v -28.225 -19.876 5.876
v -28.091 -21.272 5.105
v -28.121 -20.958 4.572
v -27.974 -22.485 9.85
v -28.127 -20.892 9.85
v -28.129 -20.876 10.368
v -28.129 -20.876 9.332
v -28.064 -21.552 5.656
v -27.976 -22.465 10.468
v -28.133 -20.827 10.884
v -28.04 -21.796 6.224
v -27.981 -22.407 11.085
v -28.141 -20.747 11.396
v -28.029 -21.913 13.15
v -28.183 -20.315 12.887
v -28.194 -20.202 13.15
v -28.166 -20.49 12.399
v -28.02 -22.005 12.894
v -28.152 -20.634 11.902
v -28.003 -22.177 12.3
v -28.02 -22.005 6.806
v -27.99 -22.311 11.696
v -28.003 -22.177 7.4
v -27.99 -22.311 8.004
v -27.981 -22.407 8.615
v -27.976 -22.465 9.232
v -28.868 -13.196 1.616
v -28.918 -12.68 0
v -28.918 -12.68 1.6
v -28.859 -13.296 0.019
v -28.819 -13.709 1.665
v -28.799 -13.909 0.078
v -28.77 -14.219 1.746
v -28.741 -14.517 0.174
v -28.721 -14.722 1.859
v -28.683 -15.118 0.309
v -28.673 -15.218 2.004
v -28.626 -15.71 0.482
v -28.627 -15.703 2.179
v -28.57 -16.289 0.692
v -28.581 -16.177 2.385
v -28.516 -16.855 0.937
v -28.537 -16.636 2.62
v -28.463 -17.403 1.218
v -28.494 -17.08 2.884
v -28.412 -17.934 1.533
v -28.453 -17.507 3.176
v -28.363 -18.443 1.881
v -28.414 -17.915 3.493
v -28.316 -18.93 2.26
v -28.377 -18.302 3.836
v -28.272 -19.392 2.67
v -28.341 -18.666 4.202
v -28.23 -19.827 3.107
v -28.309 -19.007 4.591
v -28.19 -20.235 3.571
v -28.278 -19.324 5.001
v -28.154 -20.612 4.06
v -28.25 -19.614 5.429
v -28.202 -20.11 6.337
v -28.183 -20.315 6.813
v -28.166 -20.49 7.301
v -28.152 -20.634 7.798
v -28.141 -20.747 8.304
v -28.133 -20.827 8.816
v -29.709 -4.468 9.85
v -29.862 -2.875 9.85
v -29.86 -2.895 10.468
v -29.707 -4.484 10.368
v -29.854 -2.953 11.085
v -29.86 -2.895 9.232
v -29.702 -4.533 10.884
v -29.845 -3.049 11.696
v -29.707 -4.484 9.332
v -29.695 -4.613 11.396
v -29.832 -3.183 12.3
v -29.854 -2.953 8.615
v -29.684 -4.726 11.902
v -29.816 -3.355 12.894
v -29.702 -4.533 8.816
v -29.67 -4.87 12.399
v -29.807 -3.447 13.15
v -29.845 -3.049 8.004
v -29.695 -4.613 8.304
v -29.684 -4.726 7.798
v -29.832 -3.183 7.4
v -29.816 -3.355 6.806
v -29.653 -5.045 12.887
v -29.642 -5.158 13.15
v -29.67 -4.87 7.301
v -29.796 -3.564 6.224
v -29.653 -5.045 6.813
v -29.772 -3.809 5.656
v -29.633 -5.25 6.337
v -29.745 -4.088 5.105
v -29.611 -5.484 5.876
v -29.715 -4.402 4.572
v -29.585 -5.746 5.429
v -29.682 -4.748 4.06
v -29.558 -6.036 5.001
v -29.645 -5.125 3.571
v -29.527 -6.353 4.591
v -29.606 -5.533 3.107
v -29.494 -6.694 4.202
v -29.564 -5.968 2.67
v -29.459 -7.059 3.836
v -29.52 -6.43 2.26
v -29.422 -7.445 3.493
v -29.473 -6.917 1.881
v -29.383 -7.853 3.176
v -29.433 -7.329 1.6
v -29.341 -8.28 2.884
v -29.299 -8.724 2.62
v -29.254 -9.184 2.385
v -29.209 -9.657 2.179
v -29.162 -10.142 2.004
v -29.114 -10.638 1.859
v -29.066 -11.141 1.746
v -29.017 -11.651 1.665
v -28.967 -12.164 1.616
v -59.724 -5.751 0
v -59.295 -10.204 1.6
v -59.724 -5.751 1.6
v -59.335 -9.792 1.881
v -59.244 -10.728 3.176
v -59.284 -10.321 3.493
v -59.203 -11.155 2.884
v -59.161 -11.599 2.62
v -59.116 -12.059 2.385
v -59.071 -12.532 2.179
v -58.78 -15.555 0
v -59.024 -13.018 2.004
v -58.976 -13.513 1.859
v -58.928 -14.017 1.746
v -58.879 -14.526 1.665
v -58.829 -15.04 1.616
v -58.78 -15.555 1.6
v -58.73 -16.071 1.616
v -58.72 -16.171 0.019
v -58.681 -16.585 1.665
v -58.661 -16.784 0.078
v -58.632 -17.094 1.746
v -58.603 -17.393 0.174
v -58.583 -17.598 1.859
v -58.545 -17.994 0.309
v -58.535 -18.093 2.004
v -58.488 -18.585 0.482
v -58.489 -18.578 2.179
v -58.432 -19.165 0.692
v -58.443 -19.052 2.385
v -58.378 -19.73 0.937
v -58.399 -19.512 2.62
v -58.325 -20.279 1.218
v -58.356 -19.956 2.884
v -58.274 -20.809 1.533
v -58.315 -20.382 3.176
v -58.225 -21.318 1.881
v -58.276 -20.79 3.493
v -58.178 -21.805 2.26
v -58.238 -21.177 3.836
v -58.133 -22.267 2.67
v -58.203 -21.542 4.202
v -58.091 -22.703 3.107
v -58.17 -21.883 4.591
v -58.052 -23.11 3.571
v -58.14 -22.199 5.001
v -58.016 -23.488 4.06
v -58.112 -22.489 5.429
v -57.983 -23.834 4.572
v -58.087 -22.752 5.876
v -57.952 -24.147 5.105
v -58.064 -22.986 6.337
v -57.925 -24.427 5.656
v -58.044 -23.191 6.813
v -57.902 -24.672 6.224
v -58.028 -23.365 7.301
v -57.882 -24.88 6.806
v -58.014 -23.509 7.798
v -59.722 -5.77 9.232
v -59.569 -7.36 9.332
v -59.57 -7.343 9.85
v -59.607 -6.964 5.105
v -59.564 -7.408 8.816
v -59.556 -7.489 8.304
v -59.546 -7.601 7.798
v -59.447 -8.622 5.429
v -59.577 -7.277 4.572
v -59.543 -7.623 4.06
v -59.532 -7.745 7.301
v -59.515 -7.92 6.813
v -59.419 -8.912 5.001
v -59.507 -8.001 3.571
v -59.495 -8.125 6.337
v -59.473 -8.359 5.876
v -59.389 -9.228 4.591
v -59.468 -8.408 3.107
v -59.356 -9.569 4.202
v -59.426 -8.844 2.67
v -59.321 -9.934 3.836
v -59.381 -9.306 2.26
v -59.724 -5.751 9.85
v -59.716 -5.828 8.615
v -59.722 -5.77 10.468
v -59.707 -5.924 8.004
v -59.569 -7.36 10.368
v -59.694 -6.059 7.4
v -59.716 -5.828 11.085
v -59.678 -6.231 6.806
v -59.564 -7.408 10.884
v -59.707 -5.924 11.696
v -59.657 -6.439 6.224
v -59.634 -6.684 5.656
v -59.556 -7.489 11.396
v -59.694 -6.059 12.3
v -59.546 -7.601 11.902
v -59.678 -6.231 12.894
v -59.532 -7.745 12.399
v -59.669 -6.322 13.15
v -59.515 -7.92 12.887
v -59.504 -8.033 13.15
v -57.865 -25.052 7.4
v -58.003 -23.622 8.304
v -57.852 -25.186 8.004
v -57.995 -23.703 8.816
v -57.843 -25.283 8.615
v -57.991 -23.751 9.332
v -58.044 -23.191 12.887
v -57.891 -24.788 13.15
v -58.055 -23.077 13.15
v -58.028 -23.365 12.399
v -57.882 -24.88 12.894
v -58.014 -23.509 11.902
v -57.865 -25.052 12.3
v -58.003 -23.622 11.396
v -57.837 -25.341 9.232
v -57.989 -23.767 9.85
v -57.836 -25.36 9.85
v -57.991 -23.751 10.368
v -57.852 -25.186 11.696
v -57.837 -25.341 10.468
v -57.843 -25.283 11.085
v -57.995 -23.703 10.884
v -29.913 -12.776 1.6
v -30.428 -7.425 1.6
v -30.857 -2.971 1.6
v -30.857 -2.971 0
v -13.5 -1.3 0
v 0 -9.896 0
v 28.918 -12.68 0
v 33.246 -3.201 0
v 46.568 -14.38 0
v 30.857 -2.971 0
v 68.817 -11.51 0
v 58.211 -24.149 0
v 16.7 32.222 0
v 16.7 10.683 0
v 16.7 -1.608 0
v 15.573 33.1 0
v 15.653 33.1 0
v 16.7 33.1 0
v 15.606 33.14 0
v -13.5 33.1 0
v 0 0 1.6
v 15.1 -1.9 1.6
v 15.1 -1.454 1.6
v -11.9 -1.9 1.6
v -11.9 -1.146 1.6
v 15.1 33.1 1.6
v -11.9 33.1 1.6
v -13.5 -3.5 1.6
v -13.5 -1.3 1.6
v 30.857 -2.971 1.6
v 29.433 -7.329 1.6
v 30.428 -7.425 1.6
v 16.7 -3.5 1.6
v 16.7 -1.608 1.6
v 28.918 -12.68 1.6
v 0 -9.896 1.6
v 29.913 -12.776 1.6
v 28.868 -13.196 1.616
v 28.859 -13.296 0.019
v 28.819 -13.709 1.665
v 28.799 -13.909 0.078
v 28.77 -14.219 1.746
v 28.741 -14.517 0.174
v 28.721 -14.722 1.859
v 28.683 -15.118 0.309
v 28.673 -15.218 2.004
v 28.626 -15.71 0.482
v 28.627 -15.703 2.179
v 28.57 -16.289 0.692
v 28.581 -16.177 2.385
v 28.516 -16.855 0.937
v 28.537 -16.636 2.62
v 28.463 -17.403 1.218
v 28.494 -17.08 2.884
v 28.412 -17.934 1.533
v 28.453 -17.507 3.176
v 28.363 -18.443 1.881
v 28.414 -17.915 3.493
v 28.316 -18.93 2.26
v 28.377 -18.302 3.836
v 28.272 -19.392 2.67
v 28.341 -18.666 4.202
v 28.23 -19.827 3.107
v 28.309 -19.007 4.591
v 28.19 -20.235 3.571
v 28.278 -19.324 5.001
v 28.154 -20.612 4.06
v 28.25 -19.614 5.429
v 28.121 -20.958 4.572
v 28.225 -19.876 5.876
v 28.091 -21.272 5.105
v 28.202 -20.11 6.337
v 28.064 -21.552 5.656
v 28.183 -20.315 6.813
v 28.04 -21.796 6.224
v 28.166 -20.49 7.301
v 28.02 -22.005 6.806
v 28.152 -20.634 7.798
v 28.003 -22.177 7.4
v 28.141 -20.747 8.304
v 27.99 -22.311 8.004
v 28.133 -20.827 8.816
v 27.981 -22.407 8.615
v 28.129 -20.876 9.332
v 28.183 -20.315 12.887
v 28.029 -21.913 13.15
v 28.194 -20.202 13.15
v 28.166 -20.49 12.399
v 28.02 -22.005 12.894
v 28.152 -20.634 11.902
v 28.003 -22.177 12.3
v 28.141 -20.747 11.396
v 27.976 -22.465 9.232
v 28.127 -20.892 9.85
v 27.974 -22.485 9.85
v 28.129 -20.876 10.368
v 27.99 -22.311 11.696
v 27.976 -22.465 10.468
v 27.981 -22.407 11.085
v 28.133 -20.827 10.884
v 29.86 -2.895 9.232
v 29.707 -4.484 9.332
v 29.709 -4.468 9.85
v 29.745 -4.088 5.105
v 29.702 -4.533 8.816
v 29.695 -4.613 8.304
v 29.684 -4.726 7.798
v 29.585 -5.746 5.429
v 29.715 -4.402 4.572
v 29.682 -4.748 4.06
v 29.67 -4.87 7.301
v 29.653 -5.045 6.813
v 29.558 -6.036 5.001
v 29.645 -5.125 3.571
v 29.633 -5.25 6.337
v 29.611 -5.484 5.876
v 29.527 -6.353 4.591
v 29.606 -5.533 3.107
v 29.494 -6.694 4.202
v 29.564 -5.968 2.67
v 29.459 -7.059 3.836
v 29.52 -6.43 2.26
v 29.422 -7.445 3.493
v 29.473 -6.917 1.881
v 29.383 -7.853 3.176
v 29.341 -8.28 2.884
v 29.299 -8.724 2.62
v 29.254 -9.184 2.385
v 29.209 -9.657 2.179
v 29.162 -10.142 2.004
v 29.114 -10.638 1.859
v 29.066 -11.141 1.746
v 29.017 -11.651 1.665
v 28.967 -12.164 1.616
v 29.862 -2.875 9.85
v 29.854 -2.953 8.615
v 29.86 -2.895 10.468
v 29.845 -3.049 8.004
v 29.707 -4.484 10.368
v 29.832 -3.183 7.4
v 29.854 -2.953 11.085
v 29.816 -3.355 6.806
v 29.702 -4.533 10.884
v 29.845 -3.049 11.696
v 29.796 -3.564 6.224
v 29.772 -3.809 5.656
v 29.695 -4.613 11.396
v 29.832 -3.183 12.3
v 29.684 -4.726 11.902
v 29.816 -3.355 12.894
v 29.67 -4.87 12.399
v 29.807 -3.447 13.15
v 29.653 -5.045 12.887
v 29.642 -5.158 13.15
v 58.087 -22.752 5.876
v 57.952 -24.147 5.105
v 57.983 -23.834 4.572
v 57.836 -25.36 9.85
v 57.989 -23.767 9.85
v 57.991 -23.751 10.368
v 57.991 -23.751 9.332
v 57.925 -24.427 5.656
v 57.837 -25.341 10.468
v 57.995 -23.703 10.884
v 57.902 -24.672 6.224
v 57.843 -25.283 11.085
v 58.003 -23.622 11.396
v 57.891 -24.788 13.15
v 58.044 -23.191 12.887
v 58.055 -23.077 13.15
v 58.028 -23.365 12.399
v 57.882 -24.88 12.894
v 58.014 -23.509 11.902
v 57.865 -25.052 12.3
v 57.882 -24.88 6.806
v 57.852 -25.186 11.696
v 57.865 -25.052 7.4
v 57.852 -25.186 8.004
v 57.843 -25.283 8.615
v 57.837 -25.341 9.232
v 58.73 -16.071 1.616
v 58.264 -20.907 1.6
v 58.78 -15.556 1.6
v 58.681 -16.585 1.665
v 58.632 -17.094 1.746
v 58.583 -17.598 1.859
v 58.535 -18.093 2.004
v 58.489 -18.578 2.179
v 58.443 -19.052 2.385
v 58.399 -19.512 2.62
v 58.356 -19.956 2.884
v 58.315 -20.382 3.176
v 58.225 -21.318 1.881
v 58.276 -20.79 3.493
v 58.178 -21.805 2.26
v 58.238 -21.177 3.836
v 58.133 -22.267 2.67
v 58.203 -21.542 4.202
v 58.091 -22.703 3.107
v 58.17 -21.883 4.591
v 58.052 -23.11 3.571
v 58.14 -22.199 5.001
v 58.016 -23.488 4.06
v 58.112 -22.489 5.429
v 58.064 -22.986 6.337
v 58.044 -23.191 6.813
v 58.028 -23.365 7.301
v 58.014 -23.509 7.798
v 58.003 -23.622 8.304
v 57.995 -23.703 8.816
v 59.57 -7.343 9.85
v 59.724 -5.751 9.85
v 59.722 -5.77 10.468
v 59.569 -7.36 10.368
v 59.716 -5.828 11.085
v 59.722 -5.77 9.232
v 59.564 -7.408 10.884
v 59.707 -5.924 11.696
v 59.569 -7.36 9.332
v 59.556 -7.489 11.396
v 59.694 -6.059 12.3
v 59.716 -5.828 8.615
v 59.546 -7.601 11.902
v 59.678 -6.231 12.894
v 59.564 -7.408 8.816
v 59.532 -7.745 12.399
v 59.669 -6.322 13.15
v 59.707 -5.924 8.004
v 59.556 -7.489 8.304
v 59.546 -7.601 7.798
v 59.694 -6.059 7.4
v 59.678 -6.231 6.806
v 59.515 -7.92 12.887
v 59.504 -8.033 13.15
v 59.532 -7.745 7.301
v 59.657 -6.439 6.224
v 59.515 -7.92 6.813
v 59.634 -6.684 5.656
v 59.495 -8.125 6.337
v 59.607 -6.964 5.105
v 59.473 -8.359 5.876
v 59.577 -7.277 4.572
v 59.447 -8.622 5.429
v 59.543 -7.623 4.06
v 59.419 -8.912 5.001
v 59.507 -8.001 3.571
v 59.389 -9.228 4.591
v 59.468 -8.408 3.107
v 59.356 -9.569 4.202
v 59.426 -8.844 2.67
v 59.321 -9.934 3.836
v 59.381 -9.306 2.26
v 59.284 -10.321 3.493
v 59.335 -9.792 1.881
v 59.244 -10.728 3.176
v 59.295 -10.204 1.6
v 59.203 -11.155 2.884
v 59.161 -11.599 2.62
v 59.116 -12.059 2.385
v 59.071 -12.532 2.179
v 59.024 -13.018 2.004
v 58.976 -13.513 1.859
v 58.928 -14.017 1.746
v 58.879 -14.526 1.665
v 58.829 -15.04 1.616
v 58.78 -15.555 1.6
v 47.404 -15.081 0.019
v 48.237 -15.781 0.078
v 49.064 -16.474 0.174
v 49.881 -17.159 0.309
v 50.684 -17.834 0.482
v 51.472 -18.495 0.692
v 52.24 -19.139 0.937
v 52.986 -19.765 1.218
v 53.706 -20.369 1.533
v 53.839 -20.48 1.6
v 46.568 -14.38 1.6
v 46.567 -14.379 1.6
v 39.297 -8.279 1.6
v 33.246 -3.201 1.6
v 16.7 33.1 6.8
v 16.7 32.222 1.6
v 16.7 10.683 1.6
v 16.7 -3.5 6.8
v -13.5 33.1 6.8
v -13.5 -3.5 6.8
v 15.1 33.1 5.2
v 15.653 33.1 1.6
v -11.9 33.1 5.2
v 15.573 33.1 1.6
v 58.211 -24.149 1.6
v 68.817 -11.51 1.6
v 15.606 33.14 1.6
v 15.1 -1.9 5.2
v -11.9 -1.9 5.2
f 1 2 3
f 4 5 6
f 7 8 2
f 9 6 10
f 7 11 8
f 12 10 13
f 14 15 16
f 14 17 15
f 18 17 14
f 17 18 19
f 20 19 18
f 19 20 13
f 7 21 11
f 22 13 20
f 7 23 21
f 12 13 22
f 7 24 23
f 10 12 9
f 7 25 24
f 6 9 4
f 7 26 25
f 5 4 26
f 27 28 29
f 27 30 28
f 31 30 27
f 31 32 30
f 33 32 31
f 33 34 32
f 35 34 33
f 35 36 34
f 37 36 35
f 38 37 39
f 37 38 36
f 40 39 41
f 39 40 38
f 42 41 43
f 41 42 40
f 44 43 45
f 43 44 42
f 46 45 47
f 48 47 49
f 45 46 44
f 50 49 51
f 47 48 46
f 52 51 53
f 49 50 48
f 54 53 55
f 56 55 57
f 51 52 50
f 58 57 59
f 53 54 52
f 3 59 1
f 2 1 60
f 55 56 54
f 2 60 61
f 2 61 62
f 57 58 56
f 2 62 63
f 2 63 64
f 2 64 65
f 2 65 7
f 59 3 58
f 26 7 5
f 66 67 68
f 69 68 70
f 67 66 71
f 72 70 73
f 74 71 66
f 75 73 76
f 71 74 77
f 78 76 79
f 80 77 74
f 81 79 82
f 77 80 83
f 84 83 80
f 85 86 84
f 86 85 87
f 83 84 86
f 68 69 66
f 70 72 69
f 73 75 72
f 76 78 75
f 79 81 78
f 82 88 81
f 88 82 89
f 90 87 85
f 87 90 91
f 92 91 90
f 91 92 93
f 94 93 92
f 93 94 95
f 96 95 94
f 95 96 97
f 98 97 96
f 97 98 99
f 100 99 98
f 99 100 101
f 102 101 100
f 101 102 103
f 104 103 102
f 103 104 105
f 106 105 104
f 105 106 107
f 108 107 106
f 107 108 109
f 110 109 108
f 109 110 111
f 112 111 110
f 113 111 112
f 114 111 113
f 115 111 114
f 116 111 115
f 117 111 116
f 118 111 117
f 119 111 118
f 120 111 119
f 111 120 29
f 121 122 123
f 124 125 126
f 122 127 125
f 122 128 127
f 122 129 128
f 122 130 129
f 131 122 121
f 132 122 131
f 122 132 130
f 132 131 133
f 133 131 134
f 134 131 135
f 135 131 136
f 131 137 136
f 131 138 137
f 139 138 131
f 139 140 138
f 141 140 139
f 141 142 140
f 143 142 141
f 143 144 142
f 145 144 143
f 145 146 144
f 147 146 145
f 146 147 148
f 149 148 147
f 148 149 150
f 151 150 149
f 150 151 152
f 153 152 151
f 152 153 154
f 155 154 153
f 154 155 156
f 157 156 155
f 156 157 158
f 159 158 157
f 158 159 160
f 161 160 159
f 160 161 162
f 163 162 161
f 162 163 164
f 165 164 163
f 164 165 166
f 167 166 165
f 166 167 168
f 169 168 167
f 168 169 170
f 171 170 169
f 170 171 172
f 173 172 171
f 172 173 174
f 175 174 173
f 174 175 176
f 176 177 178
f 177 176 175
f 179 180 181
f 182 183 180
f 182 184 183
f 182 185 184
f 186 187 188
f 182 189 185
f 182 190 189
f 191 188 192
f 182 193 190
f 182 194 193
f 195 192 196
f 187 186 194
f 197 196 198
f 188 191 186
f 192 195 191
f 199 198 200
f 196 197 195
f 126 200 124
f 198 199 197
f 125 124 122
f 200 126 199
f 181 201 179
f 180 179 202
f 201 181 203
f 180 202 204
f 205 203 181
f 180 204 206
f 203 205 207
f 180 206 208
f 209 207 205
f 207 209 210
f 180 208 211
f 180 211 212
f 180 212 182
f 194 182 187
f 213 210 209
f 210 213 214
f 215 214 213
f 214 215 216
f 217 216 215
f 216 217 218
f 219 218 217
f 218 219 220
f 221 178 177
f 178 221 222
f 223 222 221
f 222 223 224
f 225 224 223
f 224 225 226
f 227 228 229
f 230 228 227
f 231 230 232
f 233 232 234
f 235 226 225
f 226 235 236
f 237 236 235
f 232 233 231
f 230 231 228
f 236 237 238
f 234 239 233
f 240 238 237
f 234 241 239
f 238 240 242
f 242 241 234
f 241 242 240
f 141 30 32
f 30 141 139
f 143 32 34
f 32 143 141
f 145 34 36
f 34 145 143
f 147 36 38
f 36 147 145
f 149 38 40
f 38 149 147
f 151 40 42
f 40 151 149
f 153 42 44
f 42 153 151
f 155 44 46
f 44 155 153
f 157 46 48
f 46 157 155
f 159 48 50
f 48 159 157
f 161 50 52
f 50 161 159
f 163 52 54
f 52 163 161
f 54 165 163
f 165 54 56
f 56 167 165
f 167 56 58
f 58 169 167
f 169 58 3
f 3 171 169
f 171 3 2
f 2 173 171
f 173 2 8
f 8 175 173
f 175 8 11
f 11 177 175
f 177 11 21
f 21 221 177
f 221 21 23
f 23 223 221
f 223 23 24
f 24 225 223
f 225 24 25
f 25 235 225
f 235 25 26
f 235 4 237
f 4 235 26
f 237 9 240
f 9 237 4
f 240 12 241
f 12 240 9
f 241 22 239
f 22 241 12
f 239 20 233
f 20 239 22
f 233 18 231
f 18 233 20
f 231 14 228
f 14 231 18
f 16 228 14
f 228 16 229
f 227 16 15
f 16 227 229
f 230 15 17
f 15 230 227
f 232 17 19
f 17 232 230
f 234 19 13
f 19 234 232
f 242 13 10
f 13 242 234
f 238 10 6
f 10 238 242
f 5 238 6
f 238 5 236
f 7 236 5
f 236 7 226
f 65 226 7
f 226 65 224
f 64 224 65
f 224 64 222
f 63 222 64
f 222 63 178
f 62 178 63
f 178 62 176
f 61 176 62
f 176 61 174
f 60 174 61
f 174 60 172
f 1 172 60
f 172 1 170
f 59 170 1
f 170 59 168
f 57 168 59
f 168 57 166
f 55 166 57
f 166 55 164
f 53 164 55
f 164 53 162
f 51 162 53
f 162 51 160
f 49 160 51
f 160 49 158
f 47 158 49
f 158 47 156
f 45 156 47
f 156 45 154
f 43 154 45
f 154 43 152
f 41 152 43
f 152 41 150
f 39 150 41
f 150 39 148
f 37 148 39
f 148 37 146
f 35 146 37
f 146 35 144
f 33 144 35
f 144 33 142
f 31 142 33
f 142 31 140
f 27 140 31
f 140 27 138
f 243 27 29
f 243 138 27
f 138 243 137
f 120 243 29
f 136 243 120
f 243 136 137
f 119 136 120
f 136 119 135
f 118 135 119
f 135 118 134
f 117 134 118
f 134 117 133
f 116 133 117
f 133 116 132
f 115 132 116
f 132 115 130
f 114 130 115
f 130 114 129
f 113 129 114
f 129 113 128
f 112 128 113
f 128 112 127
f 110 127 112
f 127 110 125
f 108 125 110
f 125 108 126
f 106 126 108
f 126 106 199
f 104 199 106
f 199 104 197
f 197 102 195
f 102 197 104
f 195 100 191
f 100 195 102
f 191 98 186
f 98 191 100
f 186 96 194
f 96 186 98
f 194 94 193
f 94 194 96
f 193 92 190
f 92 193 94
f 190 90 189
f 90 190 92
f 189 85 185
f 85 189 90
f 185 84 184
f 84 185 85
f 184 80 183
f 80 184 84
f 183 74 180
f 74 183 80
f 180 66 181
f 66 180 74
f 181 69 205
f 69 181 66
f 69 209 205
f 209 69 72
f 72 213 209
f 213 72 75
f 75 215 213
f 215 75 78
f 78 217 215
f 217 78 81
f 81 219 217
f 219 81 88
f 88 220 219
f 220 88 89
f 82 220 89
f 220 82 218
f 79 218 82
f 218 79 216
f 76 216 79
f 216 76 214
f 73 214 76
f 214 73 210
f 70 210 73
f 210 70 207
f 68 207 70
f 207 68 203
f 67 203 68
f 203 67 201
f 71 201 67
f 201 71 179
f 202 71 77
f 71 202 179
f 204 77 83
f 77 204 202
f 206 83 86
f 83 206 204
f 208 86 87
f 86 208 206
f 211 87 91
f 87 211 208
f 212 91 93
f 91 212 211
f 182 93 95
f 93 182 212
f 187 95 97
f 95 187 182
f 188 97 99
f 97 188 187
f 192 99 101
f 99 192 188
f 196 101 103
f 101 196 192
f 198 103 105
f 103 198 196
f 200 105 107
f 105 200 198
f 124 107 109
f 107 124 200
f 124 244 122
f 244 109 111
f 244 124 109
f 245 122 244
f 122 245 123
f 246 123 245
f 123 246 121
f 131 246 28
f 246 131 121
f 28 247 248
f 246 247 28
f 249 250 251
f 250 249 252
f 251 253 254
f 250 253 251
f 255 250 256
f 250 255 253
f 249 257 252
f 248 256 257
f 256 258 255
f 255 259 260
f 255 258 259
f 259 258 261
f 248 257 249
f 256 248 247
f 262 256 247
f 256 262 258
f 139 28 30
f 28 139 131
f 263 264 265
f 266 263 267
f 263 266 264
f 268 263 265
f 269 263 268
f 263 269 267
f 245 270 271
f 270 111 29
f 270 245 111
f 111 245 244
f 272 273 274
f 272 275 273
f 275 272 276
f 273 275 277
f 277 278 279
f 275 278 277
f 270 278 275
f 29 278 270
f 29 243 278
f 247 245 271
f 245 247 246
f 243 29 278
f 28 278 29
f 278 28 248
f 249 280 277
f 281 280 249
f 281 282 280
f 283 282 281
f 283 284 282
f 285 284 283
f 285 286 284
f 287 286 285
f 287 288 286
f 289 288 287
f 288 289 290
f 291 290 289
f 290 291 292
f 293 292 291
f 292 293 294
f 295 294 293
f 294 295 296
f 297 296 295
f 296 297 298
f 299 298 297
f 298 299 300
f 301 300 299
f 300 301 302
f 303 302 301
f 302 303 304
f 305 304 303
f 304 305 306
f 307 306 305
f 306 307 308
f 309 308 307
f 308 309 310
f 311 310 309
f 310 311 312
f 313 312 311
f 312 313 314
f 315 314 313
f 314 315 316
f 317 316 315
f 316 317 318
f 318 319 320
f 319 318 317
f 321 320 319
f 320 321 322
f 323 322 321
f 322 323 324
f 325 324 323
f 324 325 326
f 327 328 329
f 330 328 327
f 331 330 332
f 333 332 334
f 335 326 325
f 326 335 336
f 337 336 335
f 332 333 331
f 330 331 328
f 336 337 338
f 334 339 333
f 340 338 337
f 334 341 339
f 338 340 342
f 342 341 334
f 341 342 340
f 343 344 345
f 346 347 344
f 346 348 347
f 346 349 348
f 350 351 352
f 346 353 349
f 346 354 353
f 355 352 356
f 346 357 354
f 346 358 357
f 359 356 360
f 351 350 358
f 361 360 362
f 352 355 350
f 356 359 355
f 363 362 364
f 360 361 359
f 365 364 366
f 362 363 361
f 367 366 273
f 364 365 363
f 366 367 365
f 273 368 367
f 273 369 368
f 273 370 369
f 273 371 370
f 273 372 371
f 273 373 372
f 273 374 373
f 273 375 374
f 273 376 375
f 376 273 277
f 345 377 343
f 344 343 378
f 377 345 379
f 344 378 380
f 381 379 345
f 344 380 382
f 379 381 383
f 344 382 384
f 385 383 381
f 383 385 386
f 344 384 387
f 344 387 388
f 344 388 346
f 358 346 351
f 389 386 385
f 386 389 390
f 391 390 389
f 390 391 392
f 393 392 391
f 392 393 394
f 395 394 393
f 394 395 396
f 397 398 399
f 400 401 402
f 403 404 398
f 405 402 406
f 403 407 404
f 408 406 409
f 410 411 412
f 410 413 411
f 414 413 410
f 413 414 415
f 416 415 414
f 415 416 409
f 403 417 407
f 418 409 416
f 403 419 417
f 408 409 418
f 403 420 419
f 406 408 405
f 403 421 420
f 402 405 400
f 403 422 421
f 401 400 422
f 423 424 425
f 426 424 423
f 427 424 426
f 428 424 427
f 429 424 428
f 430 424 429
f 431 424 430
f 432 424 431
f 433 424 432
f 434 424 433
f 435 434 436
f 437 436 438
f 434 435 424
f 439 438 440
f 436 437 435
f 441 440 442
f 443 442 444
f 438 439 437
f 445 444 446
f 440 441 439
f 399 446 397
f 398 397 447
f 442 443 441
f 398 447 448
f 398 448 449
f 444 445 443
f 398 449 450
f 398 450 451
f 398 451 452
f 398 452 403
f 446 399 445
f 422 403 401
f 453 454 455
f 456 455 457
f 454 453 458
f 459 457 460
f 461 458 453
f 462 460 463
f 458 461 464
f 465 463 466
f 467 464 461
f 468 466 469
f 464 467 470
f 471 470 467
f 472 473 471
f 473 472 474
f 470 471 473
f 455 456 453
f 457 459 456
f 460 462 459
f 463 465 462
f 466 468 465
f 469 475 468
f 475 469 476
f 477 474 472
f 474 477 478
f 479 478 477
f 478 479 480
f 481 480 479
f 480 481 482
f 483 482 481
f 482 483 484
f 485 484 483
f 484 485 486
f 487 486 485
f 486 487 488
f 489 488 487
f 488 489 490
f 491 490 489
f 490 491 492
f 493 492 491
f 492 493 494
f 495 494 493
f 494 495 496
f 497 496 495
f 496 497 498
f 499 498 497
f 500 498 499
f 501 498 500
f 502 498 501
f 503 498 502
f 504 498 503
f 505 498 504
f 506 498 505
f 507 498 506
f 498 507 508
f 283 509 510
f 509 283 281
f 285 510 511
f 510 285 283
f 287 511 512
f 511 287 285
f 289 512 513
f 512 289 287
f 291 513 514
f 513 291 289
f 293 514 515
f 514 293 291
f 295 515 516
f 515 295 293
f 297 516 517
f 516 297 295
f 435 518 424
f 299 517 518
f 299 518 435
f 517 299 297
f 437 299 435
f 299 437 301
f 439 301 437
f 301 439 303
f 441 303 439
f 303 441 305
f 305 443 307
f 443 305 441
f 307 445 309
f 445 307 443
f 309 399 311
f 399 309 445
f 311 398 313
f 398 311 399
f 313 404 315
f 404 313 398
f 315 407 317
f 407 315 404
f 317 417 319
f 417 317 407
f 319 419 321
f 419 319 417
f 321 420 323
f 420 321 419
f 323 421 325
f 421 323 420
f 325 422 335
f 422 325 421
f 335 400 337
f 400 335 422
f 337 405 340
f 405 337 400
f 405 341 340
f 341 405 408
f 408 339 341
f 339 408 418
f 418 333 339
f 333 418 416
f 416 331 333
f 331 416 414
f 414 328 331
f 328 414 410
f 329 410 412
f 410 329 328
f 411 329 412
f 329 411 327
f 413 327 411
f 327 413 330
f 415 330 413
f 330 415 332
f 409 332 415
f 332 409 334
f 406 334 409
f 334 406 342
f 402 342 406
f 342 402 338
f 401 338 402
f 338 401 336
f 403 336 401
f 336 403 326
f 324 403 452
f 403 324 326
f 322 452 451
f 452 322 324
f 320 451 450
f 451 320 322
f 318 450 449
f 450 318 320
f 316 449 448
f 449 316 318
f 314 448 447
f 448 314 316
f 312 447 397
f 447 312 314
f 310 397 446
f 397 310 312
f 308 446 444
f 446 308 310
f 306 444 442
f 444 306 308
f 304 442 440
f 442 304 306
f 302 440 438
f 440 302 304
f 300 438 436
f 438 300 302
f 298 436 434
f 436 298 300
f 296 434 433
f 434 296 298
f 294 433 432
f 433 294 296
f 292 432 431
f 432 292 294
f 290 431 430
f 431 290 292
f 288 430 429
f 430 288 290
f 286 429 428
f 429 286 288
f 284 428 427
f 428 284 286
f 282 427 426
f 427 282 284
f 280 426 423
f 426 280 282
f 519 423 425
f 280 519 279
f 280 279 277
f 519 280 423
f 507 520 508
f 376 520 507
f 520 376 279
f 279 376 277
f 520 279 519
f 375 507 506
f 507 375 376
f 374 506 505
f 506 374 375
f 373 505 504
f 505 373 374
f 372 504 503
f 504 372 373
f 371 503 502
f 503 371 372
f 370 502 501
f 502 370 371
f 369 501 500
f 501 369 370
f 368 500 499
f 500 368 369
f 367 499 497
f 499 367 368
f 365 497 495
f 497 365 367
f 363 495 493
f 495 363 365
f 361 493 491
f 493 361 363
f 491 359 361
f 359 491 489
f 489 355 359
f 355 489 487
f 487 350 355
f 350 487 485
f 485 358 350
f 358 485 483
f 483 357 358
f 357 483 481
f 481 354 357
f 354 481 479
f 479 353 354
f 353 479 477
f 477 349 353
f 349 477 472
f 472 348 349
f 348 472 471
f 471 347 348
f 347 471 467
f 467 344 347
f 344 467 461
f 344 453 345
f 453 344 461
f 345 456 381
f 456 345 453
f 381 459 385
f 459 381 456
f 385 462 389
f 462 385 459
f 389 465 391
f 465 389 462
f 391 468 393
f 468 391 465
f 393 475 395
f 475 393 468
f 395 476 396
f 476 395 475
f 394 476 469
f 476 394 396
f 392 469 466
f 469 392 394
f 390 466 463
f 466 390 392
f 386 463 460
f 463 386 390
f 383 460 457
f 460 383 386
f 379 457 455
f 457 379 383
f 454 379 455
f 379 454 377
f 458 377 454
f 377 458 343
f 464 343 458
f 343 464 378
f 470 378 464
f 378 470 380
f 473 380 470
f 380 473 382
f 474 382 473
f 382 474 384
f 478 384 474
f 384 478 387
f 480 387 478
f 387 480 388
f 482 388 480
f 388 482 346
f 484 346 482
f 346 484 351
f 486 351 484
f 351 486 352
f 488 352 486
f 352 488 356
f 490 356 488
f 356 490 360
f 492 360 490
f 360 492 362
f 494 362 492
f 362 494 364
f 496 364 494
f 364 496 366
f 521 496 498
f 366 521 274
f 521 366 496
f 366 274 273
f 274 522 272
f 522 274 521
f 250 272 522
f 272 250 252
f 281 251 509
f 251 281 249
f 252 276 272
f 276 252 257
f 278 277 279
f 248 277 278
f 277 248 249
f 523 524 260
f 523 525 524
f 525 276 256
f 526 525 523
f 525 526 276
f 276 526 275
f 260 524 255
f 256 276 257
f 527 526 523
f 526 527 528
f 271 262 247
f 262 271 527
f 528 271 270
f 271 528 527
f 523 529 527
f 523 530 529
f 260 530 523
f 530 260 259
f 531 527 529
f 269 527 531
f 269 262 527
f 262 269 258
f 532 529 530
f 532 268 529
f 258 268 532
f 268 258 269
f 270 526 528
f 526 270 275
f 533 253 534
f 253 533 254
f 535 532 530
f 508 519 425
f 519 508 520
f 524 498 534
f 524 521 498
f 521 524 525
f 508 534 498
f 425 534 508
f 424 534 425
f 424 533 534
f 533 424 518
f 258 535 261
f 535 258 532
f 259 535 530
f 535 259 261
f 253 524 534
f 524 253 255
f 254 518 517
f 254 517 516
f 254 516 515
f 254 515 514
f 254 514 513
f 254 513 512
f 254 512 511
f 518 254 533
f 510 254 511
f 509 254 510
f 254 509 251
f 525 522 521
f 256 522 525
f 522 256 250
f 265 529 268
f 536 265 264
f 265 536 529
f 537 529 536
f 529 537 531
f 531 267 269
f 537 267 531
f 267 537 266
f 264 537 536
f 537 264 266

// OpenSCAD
$fn = 100;
bassinet_rod_d = 16.5;


bassinet_rod_r = bassinet_rod_d / 2;

filament_t = 0.4;
shells = 2;

wall_t = filament_t * shells * 2;

clip_w = 30;

rod_clip_ratio = 0.7;

rod_angle = 11;
clip_center_spacing = 30;

slot_w = 27;
slot_h = 3.6;
slot_l = 35;

bassinet_clip_h = bassinet_rod_d * rod_clip_ratio;
module partial_ring(radius, thickness, left_ratio, right_ratio) {
    diameter = radius * 2;
    translate([0, radius + thickness])
    difference() {
        circle(r=radius + thickness);
        circle(r=radius);
        
        translate([-1, -radius + (diameter)*right_ratio])
        square(size=[radius + thickness + 2, diameter + thickness + 1]);
        translate([-radius - thickness - 1, -radius + (diameter)*left_ratio])
        square(size=[radius + thickness + 2, diameter + thickness + 1]);
        
    }
}

module bassinet_rod_clip_pattern() {
    translate([bassinet_rod_r + wall_t, 0]) {
        partial_ring(bassinet_rod_r, wall_t, rod_clip_ratio, rod_clip_ratio);
        translate([-bassinet_rod_r - wall_t, 0])
        square(size=[bassinet_rod_r + wall_t, wall_t]);
    }
}

module bassinet_rod_clip() {
    rotate([0, 0, rod_angle/2])
    translate([-clip_center_spacing, 0, 0]) {
        rotate([90, 0, -90])
        linear_extrude(height=clip_w)
        bassinet_rod_clip_pattern();
        translate([-1, -bassinet_rod_r - wall_t, 0])
        cube(size=[clip_center_spacing + 1, bassinet_rod_r + wall_t, wall_t]);
    }
}

module rod_clips() {
    bassinet_rod_clip();
    
    mirror([1, 0, 0])
    bassinet_rod_clip();
}

module slot_housing() {
    translate([-slot_w / 2, -3.5, 0]) 
    difference() {
        union() {
            cube(size=[slot_w + wall_t * 2, slot_l + wall_t, wall_t * 2 + slot_h]);
            translate([slot_w/2 + 5, slot_l - 11, 0])
            rotate([0, 0, -40])
            cube(size=[sqrt(slot_l * slot_l + (clip_center_spacing + clip_w) * (clip_center_spacing + clip_w)), bassinet_rod_d, wall_t]);
        }
        translate([wall_t, wall_t, wall_t])
        cube(size=[slot_w, slot_l + 1, slot_h]);
    }
}

module bracket() {
    rod_clips();
    slot_housing();
}

bracket();
